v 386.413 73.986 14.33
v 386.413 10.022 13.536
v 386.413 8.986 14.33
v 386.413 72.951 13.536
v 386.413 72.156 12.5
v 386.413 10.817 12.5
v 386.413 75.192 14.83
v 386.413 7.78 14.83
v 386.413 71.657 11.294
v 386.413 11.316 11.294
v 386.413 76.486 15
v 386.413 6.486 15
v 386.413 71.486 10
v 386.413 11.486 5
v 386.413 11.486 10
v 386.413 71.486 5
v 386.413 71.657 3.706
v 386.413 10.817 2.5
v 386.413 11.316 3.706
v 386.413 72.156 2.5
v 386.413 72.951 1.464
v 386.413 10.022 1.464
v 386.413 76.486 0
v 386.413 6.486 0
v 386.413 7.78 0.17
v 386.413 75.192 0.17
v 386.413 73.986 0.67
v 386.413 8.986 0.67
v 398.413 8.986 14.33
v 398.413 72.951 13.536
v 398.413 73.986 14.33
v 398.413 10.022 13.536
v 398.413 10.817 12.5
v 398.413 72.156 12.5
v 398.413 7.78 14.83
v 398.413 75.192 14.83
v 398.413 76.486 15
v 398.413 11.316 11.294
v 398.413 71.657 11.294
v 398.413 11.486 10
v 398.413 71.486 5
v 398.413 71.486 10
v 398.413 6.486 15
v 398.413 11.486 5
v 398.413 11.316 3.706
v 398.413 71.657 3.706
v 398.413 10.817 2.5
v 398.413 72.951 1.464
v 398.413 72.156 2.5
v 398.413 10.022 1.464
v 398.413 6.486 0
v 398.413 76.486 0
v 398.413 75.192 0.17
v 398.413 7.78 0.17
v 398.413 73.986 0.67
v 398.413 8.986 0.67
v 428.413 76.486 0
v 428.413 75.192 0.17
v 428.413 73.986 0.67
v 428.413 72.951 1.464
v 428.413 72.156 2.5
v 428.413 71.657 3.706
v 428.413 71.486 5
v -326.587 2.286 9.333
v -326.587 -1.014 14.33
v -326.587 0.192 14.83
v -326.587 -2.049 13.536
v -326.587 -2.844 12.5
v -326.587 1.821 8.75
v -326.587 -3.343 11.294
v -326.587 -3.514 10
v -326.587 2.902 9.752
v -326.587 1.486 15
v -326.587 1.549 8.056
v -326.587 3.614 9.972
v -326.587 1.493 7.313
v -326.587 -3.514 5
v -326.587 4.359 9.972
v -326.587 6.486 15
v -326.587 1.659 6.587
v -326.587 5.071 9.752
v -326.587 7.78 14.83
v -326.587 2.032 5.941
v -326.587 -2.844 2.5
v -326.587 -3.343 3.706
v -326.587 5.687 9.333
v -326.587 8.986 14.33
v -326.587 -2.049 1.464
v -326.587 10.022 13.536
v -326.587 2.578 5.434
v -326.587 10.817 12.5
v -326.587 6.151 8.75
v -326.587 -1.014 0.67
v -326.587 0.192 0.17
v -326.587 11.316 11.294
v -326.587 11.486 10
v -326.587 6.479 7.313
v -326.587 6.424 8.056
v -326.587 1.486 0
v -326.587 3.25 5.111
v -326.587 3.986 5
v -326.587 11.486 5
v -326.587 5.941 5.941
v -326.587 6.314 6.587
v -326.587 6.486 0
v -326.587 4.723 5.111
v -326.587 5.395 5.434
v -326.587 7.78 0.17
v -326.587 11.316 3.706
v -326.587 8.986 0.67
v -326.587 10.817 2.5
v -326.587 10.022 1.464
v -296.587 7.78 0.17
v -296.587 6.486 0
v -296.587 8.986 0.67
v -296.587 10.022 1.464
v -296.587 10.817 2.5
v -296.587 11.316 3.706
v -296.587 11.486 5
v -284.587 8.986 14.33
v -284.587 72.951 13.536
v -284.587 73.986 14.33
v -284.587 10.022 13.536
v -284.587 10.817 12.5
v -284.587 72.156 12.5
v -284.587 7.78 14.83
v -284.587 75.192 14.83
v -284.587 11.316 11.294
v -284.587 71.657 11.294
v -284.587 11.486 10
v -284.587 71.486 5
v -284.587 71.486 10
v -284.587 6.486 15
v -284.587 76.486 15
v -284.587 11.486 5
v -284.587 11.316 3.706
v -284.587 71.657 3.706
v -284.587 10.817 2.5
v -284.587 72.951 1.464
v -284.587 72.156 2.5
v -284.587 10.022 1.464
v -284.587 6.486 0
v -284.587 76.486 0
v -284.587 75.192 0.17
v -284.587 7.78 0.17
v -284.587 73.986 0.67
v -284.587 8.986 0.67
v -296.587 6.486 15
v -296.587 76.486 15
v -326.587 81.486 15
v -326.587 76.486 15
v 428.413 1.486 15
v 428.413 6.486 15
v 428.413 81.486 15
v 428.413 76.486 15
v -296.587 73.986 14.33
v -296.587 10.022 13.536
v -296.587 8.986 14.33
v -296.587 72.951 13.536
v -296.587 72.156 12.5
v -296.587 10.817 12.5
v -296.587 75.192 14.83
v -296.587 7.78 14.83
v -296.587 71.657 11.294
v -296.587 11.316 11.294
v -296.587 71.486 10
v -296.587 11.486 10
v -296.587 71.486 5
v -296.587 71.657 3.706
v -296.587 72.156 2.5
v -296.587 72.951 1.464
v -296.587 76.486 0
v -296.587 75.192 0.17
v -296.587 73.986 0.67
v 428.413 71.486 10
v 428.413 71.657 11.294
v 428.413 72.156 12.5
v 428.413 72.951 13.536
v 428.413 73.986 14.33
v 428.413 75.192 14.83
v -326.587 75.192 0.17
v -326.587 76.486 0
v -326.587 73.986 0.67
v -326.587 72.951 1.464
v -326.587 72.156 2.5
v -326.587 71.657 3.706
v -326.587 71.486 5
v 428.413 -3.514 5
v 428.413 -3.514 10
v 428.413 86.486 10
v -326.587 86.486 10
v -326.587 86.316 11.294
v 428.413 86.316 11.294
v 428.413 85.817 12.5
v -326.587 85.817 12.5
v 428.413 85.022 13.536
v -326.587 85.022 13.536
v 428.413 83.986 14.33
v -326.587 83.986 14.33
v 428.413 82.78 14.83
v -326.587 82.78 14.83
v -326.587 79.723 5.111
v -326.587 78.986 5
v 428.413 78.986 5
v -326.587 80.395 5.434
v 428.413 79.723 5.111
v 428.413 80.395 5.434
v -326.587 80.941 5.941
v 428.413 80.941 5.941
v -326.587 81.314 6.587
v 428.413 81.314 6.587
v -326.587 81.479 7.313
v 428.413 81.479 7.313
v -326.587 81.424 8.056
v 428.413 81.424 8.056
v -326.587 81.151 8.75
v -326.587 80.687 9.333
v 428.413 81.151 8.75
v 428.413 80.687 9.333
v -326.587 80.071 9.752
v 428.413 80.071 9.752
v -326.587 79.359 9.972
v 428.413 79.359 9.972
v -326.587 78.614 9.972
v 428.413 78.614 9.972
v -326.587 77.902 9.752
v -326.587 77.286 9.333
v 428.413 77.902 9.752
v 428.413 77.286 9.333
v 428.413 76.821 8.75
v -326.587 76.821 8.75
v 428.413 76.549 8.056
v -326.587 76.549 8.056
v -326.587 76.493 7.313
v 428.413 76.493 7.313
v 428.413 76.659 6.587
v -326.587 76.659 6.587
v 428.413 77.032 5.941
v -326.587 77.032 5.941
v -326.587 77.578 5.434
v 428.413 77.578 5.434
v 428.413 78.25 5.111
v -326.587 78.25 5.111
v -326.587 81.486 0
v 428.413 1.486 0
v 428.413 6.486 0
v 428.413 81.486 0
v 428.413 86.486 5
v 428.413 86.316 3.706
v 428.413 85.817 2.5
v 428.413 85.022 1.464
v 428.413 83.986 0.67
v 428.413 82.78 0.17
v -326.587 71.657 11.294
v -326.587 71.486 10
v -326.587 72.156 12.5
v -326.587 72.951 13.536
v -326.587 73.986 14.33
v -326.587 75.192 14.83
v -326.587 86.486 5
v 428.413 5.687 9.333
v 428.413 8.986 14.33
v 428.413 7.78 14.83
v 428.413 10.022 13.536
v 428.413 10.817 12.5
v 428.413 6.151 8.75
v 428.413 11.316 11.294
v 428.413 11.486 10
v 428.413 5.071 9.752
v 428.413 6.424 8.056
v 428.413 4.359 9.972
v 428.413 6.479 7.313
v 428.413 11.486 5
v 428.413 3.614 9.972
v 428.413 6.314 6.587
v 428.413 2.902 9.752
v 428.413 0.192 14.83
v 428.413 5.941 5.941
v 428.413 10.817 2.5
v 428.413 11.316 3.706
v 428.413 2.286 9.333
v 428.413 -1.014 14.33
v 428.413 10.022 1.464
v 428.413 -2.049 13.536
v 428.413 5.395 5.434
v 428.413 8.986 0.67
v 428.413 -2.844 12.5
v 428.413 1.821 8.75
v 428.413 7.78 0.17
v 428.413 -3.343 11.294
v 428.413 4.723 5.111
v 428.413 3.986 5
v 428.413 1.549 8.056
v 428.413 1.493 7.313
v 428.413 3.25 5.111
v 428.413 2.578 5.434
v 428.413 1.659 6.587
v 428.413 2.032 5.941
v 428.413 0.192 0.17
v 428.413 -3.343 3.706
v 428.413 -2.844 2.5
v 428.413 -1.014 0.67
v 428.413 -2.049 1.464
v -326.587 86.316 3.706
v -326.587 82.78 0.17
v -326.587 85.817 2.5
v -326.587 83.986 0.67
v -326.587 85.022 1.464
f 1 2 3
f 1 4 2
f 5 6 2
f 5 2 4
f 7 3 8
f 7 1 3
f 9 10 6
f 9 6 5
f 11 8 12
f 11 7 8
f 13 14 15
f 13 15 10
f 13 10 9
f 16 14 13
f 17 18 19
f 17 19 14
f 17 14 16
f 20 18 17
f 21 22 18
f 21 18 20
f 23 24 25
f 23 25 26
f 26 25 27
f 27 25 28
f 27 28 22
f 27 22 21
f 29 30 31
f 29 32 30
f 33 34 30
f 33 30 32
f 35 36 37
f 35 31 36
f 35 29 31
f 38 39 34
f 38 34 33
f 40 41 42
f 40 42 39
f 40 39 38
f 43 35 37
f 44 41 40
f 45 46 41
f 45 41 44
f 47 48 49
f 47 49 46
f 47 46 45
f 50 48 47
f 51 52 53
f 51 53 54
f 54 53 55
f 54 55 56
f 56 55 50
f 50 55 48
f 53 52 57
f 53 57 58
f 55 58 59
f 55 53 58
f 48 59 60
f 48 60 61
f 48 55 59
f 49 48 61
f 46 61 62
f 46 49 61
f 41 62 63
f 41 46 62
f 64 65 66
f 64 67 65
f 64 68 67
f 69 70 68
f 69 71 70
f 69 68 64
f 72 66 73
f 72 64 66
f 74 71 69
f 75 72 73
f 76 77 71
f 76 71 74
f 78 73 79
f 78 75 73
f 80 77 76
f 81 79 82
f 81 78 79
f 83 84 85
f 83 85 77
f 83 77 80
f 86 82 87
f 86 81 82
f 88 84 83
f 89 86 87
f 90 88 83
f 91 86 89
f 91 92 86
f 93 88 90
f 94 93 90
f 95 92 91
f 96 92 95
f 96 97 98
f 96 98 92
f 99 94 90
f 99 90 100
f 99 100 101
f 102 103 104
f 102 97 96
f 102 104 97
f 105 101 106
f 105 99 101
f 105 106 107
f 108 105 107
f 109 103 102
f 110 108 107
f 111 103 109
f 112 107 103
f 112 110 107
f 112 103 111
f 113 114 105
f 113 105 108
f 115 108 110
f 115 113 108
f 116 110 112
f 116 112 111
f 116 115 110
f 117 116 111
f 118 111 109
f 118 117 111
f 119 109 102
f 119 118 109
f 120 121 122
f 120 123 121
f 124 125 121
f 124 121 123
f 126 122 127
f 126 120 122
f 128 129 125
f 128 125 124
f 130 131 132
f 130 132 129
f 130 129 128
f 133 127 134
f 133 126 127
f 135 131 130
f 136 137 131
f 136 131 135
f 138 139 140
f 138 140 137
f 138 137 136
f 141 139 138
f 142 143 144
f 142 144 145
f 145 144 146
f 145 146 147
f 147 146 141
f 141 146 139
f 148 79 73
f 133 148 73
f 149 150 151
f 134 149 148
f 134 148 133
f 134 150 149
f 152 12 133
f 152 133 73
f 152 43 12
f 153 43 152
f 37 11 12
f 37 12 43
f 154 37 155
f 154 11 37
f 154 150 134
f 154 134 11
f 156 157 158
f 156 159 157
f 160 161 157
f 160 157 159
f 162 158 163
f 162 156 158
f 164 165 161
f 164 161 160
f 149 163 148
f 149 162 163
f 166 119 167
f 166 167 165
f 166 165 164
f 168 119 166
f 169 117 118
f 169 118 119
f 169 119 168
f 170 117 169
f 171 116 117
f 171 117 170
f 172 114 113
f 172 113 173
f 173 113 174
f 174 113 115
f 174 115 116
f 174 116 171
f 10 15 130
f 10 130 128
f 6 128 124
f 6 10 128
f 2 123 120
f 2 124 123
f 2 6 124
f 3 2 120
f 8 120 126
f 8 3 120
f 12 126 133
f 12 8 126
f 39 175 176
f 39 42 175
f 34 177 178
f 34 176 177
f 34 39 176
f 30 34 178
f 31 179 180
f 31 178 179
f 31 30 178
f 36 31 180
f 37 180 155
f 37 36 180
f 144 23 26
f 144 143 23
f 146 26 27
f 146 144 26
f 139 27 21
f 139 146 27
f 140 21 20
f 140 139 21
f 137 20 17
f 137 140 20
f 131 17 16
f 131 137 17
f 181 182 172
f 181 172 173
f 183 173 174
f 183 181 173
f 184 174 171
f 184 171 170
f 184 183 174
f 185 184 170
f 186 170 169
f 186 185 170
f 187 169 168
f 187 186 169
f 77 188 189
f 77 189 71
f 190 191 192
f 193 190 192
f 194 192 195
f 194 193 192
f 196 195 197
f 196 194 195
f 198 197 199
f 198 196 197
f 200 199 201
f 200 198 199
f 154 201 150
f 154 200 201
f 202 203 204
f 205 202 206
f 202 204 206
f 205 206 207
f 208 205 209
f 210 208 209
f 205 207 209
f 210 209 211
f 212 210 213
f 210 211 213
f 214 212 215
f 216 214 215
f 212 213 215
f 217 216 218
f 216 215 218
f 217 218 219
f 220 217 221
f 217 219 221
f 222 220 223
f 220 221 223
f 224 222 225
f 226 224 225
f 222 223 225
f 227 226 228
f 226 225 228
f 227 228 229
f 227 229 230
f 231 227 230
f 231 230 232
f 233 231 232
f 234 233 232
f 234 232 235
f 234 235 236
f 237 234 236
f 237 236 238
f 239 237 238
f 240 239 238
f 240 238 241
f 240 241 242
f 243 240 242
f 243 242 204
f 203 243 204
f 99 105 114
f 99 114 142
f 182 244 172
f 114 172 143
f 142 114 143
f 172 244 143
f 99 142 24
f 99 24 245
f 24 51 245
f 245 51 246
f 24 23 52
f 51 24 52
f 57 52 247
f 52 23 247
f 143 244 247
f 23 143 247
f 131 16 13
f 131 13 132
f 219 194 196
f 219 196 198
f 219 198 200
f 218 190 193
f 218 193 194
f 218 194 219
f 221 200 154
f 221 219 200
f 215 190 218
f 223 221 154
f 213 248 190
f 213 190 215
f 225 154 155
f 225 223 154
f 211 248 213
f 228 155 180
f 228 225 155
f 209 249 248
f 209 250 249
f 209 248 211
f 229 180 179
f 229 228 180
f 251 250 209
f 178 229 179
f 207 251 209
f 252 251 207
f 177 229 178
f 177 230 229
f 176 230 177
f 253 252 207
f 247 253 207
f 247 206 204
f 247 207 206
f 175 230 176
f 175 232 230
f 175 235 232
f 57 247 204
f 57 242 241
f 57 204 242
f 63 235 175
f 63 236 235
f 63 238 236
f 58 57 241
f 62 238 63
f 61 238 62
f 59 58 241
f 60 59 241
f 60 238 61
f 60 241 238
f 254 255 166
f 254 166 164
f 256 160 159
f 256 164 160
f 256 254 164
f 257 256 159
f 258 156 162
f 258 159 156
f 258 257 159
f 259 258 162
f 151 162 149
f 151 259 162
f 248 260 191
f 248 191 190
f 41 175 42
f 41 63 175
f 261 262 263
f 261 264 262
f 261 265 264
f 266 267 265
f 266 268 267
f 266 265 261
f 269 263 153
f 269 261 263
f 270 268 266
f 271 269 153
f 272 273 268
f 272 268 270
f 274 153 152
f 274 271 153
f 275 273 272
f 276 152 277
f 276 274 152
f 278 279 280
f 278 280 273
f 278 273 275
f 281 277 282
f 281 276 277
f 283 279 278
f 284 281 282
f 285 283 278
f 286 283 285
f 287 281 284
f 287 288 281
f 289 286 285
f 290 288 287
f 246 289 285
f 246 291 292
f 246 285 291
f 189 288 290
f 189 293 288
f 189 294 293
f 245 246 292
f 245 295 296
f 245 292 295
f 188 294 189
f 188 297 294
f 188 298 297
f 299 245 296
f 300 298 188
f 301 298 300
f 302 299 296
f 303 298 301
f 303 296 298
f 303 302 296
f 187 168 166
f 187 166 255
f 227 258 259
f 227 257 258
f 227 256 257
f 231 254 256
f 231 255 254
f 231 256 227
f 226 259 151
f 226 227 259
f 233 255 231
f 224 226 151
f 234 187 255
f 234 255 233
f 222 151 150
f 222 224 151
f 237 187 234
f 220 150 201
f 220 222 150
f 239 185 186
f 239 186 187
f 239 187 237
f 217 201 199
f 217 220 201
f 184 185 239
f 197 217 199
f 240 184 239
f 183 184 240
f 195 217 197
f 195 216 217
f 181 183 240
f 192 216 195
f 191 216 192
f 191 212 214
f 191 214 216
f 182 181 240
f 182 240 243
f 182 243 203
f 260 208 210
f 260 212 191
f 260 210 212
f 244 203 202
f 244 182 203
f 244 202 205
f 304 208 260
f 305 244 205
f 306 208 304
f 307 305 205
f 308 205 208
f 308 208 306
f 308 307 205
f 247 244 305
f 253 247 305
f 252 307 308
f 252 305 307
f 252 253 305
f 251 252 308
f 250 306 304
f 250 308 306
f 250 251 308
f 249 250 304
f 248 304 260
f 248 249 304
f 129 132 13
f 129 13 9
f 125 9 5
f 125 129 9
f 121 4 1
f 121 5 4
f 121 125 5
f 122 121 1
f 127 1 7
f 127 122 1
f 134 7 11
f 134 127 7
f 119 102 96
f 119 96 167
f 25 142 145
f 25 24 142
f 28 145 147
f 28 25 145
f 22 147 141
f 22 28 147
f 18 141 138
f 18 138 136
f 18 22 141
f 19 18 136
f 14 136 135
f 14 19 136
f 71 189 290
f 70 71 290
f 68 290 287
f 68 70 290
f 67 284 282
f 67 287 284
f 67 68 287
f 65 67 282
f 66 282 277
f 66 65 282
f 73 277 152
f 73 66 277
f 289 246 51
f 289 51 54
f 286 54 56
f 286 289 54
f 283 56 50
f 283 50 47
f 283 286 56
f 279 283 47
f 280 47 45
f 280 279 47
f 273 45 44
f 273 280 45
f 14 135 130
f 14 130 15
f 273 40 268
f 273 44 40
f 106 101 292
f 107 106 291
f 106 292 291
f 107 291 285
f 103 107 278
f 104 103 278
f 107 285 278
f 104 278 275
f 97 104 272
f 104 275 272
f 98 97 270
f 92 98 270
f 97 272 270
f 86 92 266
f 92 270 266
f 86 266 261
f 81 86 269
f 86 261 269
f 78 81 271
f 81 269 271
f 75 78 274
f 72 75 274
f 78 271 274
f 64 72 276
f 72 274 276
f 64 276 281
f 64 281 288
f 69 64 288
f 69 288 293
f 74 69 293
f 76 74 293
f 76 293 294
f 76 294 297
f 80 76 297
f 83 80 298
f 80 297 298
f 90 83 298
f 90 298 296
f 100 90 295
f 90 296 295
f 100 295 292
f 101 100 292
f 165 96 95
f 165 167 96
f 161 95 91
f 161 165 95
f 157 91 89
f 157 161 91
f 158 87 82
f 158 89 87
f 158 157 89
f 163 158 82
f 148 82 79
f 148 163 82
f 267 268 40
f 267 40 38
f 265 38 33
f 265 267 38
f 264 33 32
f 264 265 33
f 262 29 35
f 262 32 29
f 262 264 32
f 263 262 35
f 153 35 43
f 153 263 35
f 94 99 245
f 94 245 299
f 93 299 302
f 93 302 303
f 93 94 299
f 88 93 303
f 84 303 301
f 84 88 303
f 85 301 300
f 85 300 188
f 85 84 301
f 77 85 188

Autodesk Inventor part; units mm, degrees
ref_plane "YZ Plane" through (0, 0, 0) normal (1, 0, 0) x (0, 1, 0)
ref_plane "XZ Plane" through (0, 0, 0) normal (0, 1, 0) x (-1, 0, 0)
ref_plane "XY Plane" through (0, 0, 0) normal (0, 0, 1) x (1, 0, 0)
sketch "草图1" plane through (0, 0, 0) normal (0, 0, 1) x (1, 0, 0)
  line L0 (-326.5872, 86.4864) -> (428.4128, 86.4864)
  line L1 (428.4128, 86.4864) -> (428.4128, 71.4864)
  line L2 (-326.5872, 71.4864) -> (-326.5872, 86.4864)
  line L3 (428.4128, 11.4864) -> (428.4128, -3.5136)
  line L4 (428.4128, -3.5136) -> (-326.5872, -3.5136)
  line L5 (-326.5872, -3.5136) -> (-326.5872, 11.4864)
  line L6 (-284.5872, 71.4864) -> (-284.5872, 11.4864)
  line L7 (-296.5872, 11.4864) -> (-296.5872, 71.4864)
  line L8 (398.4128, 71.4864) -> (398.4128, 11.4864)
  line L9 (386.4128, 11.4864) -> (386.4128, 71.4864)
  line L10 (-296.5872, 71.4864) -> (-326.5872, 71.4864)
  line L11 (-326.5872, 11.4864) -> (-296.5872, 11.4864)
  line L12 (428.4128, 71.4864) -> (398.4128, 71.4864)
  line L13 (386.4128, 71.4864) -> (-284.5872, 71.4864)
  line L14 (-284.5872, 11.4864) -> (386.4128, 11.4864)
  line L15 (398.4128, 11.4864) -> (428.4128, 11.4864)
  point P0 (0, 0)
  point P1 (-326.5872, 78.9864)
  point P2 (-326.5872, 3.9864)
  dimension "d0" = 755
  dimension "d1" = 15
  dimension "d2" = 15
  dimension "d3" = 7.5
  dimension "d4" = 75
  dimension "d5" = 12
  dimension "d6" = 12
  dimension "d7" = 30
  dimension "d8" = 30
extrude "拉伸1" add sketch "草图1" along normal blind 15
fillet "圆角1" radius 5 1 edges at (50.9128, 86.4864, 15)
fillet "圆角2" radius 5 12 edges at (50.9128, 86.4864, 0) (50.9128, 71.4864, 15) (413.4128, 71.4864, 15) (413.4128, 11.4864, 15) (413.4128, 11.4864, 0) (50.9128, -3.5136, 15) (50.9128, 11.4864, 15) (50.9128, 11.4864, 0) (50.9128, -3.5136, 0) (-311.5872, 11.4864, 15) (-311.5872, 71.4864, 15) (-311.5872, 71.4864, 0)
fillet "圆角3" radius 5 3 edges at (-311.5872, 11.4864, 0) (413.4128, 71.4864, 0) (50.9128, 71.4864, 0)
sketch "草图2" plane through (428.4128, 76.4864, 15) normal (1, 0, 0) x (0, 0, -1)
  line L0 (15, 5) -> (15, 0) projected
  line L1 (10, -5) -> (5, -5) projected
  circle A0 centre (7.5, 2.5) radius 2.5
  circle A1 centre (7.5, -72.5) radius 2.5
  line L2 (15, -70) -> (15, -75) projected
  line L3 (10, -65) -> (5, -65) projected
  point P0 (15, -76.4864)
  dimension "d14" = 7.5
  dimension "d15" = 7.5
  dimension "d16" = 7.5
  dimension "d17" = 7.5
  dimension "d18" = 5
extrude "拉伸2" cut sketch "草图2" against normal blind 800
properties part number "Desk foot holding bar"
